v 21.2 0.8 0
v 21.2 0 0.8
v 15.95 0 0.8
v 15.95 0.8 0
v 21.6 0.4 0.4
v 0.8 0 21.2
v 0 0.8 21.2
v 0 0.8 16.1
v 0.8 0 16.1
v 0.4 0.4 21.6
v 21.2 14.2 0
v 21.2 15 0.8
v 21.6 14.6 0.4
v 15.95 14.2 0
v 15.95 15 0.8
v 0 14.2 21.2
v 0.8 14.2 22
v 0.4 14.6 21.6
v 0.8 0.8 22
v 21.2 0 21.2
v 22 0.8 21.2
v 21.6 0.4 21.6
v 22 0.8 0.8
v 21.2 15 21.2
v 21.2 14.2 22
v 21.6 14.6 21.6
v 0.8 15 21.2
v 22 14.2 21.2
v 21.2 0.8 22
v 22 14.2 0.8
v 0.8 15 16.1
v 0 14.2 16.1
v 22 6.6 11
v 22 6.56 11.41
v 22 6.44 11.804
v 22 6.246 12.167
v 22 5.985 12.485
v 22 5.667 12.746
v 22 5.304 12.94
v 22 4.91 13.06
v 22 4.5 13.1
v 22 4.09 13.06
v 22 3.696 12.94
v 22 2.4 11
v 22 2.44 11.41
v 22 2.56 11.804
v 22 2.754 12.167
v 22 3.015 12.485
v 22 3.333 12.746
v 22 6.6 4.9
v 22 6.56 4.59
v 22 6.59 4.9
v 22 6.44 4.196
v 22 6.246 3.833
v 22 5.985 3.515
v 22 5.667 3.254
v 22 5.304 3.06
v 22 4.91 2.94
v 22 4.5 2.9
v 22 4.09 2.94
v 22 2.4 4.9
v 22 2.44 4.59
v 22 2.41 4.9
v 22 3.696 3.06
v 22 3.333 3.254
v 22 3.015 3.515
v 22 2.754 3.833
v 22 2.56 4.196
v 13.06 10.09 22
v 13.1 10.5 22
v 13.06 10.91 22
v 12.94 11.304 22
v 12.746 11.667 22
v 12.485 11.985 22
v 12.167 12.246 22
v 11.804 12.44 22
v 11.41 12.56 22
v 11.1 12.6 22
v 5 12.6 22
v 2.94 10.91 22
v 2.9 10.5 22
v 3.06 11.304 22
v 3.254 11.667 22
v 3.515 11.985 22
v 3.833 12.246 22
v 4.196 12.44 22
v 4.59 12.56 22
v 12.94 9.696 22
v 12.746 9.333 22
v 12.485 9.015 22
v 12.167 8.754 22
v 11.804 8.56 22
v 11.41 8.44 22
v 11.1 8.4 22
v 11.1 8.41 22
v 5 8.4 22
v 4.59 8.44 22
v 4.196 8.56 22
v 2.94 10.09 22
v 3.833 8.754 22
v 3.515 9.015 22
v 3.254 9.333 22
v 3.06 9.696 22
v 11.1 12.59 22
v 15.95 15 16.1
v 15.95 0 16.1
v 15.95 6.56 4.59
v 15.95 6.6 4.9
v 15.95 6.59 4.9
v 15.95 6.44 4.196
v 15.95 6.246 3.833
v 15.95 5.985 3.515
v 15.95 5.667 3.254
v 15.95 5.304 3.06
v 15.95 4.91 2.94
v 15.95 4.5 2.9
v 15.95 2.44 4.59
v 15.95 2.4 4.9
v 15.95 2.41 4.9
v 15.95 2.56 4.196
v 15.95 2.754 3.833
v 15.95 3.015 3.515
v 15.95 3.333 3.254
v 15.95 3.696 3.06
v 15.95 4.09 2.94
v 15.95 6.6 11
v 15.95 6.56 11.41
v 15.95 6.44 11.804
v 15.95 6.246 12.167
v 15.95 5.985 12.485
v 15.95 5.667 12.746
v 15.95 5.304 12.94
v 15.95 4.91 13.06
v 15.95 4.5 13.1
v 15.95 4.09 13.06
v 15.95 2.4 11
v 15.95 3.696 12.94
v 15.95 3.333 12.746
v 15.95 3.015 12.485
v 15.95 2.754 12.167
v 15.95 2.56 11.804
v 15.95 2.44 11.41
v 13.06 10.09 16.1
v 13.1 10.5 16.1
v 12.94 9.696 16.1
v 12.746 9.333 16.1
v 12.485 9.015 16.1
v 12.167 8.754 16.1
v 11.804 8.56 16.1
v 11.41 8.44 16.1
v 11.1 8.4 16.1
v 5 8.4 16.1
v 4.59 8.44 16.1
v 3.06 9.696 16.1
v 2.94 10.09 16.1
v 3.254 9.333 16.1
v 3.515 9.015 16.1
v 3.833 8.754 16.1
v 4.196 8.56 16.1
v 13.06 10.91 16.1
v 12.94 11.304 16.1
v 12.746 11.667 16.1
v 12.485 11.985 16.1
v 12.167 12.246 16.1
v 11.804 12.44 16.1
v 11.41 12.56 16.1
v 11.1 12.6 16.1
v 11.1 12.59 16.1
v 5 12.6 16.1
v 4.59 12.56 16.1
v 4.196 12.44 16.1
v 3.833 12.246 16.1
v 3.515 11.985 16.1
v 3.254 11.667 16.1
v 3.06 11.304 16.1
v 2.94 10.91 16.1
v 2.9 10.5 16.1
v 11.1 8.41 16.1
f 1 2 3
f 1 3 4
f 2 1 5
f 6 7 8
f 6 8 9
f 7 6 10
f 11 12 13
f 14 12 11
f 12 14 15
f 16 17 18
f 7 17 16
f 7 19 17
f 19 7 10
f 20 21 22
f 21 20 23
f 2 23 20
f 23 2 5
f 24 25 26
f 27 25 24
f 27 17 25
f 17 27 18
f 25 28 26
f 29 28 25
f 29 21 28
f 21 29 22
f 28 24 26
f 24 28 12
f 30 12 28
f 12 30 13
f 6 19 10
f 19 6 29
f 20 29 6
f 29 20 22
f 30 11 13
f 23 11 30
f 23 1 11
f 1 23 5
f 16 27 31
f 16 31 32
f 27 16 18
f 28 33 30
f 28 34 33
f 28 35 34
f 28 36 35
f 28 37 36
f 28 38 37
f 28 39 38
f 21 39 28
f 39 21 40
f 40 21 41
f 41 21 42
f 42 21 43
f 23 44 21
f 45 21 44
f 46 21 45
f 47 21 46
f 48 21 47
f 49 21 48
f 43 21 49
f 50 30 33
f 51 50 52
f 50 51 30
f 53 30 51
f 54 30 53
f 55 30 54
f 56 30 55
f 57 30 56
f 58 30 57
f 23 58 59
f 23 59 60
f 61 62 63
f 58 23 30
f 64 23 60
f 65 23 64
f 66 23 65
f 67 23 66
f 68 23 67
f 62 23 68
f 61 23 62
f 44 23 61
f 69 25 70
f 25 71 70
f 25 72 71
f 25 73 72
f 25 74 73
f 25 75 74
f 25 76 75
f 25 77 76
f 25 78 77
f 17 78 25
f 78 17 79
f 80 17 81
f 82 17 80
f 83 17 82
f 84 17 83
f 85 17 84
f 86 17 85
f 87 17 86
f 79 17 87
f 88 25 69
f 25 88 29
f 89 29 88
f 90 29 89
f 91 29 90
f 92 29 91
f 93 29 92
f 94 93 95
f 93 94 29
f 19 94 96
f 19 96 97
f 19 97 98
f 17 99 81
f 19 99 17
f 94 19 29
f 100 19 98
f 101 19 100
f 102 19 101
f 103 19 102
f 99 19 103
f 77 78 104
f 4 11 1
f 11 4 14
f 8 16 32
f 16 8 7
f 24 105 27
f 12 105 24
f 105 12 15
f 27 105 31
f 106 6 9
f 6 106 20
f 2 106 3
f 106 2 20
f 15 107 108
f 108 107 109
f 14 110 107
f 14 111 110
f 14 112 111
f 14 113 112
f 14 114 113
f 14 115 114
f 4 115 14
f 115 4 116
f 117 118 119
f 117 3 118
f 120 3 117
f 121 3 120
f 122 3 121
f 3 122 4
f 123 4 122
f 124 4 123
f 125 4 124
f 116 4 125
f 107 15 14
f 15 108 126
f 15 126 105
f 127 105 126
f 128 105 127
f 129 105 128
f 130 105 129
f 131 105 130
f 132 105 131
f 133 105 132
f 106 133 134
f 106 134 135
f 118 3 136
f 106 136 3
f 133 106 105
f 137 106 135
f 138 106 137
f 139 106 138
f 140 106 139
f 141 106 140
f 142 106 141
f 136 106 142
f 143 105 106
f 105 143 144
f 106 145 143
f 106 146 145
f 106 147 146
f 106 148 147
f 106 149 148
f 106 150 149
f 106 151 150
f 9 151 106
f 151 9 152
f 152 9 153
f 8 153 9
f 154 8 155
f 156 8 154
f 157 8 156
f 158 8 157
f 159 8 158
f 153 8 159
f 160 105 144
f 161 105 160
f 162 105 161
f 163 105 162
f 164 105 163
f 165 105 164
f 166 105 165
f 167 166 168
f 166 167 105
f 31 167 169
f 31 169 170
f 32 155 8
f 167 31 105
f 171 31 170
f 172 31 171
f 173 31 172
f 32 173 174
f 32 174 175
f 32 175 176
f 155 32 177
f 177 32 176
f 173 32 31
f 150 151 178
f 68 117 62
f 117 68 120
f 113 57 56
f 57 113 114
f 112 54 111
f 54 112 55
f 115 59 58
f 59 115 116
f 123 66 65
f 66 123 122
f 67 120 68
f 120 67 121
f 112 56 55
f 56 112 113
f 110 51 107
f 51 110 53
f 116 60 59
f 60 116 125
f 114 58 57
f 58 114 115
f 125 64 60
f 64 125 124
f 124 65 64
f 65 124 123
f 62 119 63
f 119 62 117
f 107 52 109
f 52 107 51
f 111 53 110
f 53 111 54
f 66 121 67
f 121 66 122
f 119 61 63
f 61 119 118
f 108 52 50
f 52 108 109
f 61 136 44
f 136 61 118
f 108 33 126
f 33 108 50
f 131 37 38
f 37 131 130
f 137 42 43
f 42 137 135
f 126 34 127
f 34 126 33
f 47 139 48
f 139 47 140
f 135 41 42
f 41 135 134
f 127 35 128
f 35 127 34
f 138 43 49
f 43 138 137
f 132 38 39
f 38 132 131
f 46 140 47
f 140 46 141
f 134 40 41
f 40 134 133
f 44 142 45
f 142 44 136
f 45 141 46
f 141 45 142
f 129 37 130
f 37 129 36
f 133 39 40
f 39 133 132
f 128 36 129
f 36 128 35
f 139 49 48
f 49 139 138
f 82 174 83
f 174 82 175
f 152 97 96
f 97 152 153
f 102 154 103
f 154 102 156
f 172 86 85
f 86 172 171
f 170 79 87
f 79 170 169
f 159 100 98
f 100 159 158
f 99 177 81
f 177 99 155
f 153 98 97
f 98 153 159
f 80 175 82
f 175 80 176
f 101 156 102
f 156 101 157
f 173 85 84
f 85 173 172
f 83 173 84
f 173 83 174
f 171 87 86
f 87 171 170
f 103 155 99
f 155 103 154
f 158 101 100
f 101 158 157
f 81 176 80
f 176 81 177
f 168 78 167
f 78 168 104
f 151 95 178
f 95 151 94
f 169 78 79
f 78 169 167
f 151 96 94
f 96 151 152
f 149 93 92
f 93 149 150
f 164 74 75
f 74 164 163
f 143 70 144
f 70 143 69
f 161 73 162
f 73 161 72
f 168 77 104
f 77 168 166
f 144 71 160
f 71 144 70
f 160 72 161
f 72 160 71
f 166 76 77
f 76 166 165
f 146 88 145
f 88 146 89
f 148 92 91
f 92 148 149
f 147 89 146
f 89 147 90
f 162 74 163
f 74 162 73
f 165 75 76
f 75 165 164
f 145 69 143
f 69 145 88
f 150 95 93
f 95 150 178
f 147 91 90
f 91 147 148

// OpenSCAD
// file: Chamfer.scad
/**
  *  The MIT License (MIT)
  *
  *  "Chamfers for OpenSCAD" v0.3 Copyright (c) 2016 SebiTimeWaster
  *
  *  Permission is hereby granted, free of charge, to any person obtaining a copy
  *  of this software and associated documentation files (the "Software"), to deal
  *  in the Software without restriction, including without limitation the rights
  *  to use, copy, modify, merge, publish, distribute, sublicense, and/or sell
  *  copies of the Software, and to permit persons to whom the Software is
  *  furnished to do so, subject to the following conditions:
  *
  *  The above copyright notice and this permission notice shall be included in all
  *  copies or substantial portions of the Software.
  *
  *  THE SOFTWARE IS PROVIDED "AS IS", WITHOUT WARRANTY OF ANY KIND, EXPRESS OR
  *  IMPLIED, INCLUDING BUT NOT LIMITED TO THE WARRANTIES OF MERCHANTABILITY,
  *  FITNESS FOR A PARTICULAR PURPOSE AND NONINFRINGEMENT. IN NO EVENT SHALL THE
  *  AUTHORS OR COPYRIGHT HOLDERS BE LIABLE FOR ANY CLAIM, DAMAGES OR OTHER
  *  LIABILITY, WHETHER IN AN ACTION OF CONTRACT, TORT OR OTHERWISE, ARISING FROM,
  *  OUT OF OR IN CONNECTION WITH THE SOFTWARE OR THE USE OR OTHER DEALINGS IN THE
  *  SOFTWARE.
  */

/**
  * chamferCube returns an cube with 45° chamfers on the edges of the
  * cube. The chamfers are diectly printable on Fused deposition
  * modelling (FDM) printers without support structures.
  *
  * @param  sizeX          The size of the cube along the x axis
  * @param  sizeY          The size of the cube along the y axis
  * @param  sizeZ          The size of the cube along the z axis
  * @param  chamferHeight  The "height" of the chamfers as seen from
  *                        one of the dimensional planes (The real
  *                        width is side c in a right angled triangle)
  * @param  chamferX       Which chamfers to render along the x axis
  *                        in clockwise order starting from the zero
  *                        point, as seen from "Left view" (Ctrl + 6)
  * @param  chamferY       Which chamfers to render along the y axis
  *                        in clockwise order starting from the zero
  *                        point, as seen from "Front view" (Ctrl + 8)
  * @param  chamferZ       Which chamfers to render along the z axis
  *                        in clockwise order starting from the zero
  *                        point, as seen from "Bottom view" (Ctrl + 5)
  */
module chamferCube(sizeX, sizeY, sizeZ, chamferHeight = 1, chamferX = [1, 1, 1, 1], chamferY = [1, 1, 1, 1], chamferZ = [1, 1, 1, 1]) {
    chamferCLength = sqrt(chamferHeight * chamferHeight * 2);
    difference() {
        cube([sizeX, sizeY, sizeZ]);
        for(x = [0 : 3]) {
            chamferSide1 = min(x, 1) - floor(x / 3); // 0 1 1 0
            chamferSide2 = floor(x / 2); // 0 0 1 1
            if(chamferX[x]) {
                translate([-0.1, chamferSide1 * sizeY, -chamferHeight + chamferSide2 * sizeZ])
                rotate([45, 0, 0])
                cube([sizeX + 0.2, chamferCLength, chamferCLength]);
            }
            if(chamferY[x]) {
                translate([-chamferHeight + chamferSide2 * sizeX, -0.1, chamferSide1 * sizeZ])
                rotate([0, 45, 0])
                cube([chamferCLength, sizeY + 0.2, chamferCLength]);
            }
            if(chamferZ[x]) {
                translate([chamferSide1 * sizeX, -chamferHeight + chamferSide2 * sizeY, -0.1])
                rotate([0, 0, 45])
                cube([chamferCLength, chamferCLength, sizeZ + 0.2]);
            }
        }
    }
}

/**
  * chamferCylinder returns an cylinder or cone with 45° chamfers on
  * the edges of the cylinder. The chamfers are diectly printable on
  * Fused deposition modelling (FDM) printers without support structures.
  *
  * @param  height         Height of the cylinder
  * @param  radius         Radius of the cylinder (At the bottom)
  * @param  radius2        Radius of the cylinder (At the top)
  * @param  chamferHeight  The "height" of the chamfers as seen from
  *                        one of the dimensional planes (The real
  *                        width is side c in a right angled triangle)
  * @param  angle          The radius of the visible part of a wedge
  *                        starting from the x axis counter-clockwise
  * @param  quality        A circle quality factor where 1.0 is a fairly
  *                        good quality, range from 0.0 to 2.0
  */
module chamferCylinder(height, radius, radius2=undef, chamferHeight = 1, angle = 0, quality = -1.0) {
    radius2 = (radius2 == undef) ? radius : radius2;
    module cc() {
        if(chamferHeight != 0) {
            translate([0, 0, height - abs(chamferHeight)]) cylinder(abs(chamferHeight), r1 = radius2, r2 = radius2 - chamferHeight, $fn = circleSegments(radius2, quality));
        }
        translate([0, 0, abs(chamferHeight)]) cylinder(height - abs(chamferHeight) * 2, r1 = radius, r2 = radius2, $fn = circleSegments(max(radius, radius2), quality));
        if(chamferHeight != 0) {
            cylinder(abs(chamferHeight), r1 = radius - chamferHeight, r2 = radius, $fn = circleSegments(radius, quality));
        }
    }
    module box(brim = abs(min(chamferHeight, 0)) + 1) {
        translate([-radius - brim, 0, -brim]) cube([radius * 2 + brim * 2, radius + brim, height + brim * 2]);
    }
    module hcc() {
        intersection() {
            cc();
            box();
        }
    }
    if(angle <= 0 || angle >= 360) cc();
    else {
        if(angle > 180) hcc();
        difference() {
            if(angle <= 180) hcc();
            else rotate([0, 0, 180]) hcc();
            rotate([0, 0, angle]) box(abs(min(chamferHeight, 0)) + radius);
        }
    }
}

/**
  * circleSegments calculates the number of segments needed to maintain
  * a constant circle quality.
  * If a globalSegementsQuality variable exist it will overwrite the
  * standard quality setting (1.0). Order of usage is:
  * Standard (1.0) <- globalCircleQuality <- Quality parameter
  *
  * @param  r        Radius of the circle
  * @param  quality  A quality factor, where 1.0 is a fairly good
  *                  quality, range from 0.0 to 2.0
  *
  * @return  The number of segments for the circle
  */
function circleSegments(r, quality = -1.0) = (r * PI * 4 + 40) * ((quality >= 0.0) ? quality : globalCircleQuality);

// set global quality to 1.0, can be overridden by user
globalCircleQuality = 1.0;
// main file
include <Chamfer.scad>;

length = 22;
width = 15;
height = 22;
cutoff_height = 16;
cutoff_space = 16;
cutoff_pos = 5;
cutoff_pos2 = 11;
epsilon = 0.1;
fn = 32;
drill_diameter = 4.2;
delta = 3;

difference()
{
//    cube([length, width, height], center = false);
    chamferCube(length, width, height, 0.8);
    translate([-epsilon / 2, -epsilon / 2, 0]) cube([cutoff_space, width + epsilon, cutoff_height + epsilon], center = false);
    
    translate([-epsilon / 2, width / 2 - delta, cutoff_pos]) rotate([0, 90, 0]) cylinder(d=drill_diameter,h=length + epsilon, $fn=fn);
    translate([-epsilon / 2, width / 2 - drill_diameter / 2 - delta, cutoff_pos2]) rotate([0, 90, 0]) cube([cutoff_pos2 - cutoff_pos + epsilon, drill_diameter, height + epsilon], center = false);
    translate([-epsilon / 2, width / 2- delta, cutoff_pos2]) rotate([0, 90, 0]) cylinder(d=drill_diameter,h=length + epsilon, $fn=fn);
    
    translate([cutoff_pos, width / 2 + delta, 0]) cylinder(d=drill_diameter,h=height + epsilon, $fn=fn);
    translate([cutoff_pos, width / 2 - drill_diameter / 2 + delta, 0]) cube([cutoff_pos2 - cutoff_pos + epsilon, drill_diameter, height + epsilon], center = false);
    translate([cutoff_pos2, width / 2 + delta, 0]) cylinder(d=drill_diameter,h=height + epsilon, $fn=fn);
}
